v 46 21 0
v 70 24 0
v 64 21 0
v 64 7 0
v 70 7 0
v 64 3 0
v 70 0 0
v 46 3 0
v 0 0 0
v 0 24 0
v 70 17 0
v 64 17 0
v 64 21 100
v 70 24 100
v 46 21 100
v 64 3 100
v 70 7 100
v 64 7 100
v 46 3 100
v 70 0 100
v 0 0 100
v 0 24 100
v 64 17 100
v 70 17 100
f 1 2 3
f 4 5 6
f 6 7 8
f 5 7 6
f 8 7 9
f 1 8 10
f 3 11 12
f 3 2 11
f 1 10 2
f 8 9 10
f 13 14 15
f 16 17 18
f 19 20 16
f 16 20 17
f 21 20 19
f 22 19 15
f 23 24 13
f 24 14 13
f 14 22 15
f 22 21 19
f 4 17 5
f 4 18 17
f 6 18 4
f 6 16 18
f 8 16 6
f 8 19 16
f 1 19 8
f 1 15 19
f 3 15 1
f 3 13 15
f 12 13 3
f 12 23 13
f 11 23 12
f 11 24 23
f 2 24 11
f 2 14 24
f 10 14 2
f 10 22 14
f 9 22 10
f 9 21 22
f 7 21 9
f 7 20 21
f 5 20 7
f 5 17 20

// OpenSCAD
$fn = 32;

// ----------------------------------------------------------------------
// T-slot rail: 70 x 24 mm section, 100 mm long
// ----------------------------------------------------------------------

// --- parameters (mm) ---
profile_height = 100;     // extrusion height
profile_points = 12;      // points of the closed outline

profile = [[0, 0], [70, 0], [70, 7], [64, 7], [64, 3], [46, 3], [46, 21], [64, 21], [64, 17], [70, 17], [70, 24], [0, 24]];  // single closed polygon, 12 points, counter clockwise

// --- the one profile operation ---
linear_extrude(height = profile_height) polygon(points = profile);
